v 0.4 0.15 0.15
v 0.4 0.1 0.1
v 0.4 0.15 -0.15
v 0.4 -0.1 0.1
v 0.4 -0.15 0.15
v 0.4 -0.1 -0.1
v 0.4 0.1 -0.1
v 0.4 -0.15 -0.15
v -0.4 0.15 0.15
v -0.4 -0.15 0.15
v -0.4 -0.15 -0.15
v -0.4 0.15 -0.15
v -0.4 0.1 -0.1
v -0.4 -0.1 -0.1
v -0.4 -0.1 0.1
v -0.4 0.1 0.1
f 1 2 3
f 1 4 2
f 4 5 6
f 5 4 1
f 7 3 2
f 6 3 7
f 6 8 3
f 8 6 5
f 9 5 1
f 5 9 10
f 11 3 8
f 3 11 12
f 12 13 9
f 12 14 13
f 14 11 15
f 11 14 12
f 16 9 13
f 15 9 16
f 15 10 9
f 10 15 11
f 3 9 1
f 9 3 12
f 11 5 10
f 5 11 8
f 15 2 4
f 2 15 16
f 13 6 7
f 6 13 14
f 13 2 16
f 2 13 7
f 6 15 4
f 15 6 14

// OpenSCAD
$fn=64;

outer = [0.8, 0.3, 0.3];
wall = 0.05;

module rect_tube(outer_size=[1,1,1], wall_th=0.1){
    inner_size = [outer_size[0], outer_size[1]-2*wall_th, outer_size[2]-2*wall_th];
    difference(){
        cube(outer_size, center=true);
        cube(inner_size, center=true);
    }
}

rect_tube(outer, wall);
